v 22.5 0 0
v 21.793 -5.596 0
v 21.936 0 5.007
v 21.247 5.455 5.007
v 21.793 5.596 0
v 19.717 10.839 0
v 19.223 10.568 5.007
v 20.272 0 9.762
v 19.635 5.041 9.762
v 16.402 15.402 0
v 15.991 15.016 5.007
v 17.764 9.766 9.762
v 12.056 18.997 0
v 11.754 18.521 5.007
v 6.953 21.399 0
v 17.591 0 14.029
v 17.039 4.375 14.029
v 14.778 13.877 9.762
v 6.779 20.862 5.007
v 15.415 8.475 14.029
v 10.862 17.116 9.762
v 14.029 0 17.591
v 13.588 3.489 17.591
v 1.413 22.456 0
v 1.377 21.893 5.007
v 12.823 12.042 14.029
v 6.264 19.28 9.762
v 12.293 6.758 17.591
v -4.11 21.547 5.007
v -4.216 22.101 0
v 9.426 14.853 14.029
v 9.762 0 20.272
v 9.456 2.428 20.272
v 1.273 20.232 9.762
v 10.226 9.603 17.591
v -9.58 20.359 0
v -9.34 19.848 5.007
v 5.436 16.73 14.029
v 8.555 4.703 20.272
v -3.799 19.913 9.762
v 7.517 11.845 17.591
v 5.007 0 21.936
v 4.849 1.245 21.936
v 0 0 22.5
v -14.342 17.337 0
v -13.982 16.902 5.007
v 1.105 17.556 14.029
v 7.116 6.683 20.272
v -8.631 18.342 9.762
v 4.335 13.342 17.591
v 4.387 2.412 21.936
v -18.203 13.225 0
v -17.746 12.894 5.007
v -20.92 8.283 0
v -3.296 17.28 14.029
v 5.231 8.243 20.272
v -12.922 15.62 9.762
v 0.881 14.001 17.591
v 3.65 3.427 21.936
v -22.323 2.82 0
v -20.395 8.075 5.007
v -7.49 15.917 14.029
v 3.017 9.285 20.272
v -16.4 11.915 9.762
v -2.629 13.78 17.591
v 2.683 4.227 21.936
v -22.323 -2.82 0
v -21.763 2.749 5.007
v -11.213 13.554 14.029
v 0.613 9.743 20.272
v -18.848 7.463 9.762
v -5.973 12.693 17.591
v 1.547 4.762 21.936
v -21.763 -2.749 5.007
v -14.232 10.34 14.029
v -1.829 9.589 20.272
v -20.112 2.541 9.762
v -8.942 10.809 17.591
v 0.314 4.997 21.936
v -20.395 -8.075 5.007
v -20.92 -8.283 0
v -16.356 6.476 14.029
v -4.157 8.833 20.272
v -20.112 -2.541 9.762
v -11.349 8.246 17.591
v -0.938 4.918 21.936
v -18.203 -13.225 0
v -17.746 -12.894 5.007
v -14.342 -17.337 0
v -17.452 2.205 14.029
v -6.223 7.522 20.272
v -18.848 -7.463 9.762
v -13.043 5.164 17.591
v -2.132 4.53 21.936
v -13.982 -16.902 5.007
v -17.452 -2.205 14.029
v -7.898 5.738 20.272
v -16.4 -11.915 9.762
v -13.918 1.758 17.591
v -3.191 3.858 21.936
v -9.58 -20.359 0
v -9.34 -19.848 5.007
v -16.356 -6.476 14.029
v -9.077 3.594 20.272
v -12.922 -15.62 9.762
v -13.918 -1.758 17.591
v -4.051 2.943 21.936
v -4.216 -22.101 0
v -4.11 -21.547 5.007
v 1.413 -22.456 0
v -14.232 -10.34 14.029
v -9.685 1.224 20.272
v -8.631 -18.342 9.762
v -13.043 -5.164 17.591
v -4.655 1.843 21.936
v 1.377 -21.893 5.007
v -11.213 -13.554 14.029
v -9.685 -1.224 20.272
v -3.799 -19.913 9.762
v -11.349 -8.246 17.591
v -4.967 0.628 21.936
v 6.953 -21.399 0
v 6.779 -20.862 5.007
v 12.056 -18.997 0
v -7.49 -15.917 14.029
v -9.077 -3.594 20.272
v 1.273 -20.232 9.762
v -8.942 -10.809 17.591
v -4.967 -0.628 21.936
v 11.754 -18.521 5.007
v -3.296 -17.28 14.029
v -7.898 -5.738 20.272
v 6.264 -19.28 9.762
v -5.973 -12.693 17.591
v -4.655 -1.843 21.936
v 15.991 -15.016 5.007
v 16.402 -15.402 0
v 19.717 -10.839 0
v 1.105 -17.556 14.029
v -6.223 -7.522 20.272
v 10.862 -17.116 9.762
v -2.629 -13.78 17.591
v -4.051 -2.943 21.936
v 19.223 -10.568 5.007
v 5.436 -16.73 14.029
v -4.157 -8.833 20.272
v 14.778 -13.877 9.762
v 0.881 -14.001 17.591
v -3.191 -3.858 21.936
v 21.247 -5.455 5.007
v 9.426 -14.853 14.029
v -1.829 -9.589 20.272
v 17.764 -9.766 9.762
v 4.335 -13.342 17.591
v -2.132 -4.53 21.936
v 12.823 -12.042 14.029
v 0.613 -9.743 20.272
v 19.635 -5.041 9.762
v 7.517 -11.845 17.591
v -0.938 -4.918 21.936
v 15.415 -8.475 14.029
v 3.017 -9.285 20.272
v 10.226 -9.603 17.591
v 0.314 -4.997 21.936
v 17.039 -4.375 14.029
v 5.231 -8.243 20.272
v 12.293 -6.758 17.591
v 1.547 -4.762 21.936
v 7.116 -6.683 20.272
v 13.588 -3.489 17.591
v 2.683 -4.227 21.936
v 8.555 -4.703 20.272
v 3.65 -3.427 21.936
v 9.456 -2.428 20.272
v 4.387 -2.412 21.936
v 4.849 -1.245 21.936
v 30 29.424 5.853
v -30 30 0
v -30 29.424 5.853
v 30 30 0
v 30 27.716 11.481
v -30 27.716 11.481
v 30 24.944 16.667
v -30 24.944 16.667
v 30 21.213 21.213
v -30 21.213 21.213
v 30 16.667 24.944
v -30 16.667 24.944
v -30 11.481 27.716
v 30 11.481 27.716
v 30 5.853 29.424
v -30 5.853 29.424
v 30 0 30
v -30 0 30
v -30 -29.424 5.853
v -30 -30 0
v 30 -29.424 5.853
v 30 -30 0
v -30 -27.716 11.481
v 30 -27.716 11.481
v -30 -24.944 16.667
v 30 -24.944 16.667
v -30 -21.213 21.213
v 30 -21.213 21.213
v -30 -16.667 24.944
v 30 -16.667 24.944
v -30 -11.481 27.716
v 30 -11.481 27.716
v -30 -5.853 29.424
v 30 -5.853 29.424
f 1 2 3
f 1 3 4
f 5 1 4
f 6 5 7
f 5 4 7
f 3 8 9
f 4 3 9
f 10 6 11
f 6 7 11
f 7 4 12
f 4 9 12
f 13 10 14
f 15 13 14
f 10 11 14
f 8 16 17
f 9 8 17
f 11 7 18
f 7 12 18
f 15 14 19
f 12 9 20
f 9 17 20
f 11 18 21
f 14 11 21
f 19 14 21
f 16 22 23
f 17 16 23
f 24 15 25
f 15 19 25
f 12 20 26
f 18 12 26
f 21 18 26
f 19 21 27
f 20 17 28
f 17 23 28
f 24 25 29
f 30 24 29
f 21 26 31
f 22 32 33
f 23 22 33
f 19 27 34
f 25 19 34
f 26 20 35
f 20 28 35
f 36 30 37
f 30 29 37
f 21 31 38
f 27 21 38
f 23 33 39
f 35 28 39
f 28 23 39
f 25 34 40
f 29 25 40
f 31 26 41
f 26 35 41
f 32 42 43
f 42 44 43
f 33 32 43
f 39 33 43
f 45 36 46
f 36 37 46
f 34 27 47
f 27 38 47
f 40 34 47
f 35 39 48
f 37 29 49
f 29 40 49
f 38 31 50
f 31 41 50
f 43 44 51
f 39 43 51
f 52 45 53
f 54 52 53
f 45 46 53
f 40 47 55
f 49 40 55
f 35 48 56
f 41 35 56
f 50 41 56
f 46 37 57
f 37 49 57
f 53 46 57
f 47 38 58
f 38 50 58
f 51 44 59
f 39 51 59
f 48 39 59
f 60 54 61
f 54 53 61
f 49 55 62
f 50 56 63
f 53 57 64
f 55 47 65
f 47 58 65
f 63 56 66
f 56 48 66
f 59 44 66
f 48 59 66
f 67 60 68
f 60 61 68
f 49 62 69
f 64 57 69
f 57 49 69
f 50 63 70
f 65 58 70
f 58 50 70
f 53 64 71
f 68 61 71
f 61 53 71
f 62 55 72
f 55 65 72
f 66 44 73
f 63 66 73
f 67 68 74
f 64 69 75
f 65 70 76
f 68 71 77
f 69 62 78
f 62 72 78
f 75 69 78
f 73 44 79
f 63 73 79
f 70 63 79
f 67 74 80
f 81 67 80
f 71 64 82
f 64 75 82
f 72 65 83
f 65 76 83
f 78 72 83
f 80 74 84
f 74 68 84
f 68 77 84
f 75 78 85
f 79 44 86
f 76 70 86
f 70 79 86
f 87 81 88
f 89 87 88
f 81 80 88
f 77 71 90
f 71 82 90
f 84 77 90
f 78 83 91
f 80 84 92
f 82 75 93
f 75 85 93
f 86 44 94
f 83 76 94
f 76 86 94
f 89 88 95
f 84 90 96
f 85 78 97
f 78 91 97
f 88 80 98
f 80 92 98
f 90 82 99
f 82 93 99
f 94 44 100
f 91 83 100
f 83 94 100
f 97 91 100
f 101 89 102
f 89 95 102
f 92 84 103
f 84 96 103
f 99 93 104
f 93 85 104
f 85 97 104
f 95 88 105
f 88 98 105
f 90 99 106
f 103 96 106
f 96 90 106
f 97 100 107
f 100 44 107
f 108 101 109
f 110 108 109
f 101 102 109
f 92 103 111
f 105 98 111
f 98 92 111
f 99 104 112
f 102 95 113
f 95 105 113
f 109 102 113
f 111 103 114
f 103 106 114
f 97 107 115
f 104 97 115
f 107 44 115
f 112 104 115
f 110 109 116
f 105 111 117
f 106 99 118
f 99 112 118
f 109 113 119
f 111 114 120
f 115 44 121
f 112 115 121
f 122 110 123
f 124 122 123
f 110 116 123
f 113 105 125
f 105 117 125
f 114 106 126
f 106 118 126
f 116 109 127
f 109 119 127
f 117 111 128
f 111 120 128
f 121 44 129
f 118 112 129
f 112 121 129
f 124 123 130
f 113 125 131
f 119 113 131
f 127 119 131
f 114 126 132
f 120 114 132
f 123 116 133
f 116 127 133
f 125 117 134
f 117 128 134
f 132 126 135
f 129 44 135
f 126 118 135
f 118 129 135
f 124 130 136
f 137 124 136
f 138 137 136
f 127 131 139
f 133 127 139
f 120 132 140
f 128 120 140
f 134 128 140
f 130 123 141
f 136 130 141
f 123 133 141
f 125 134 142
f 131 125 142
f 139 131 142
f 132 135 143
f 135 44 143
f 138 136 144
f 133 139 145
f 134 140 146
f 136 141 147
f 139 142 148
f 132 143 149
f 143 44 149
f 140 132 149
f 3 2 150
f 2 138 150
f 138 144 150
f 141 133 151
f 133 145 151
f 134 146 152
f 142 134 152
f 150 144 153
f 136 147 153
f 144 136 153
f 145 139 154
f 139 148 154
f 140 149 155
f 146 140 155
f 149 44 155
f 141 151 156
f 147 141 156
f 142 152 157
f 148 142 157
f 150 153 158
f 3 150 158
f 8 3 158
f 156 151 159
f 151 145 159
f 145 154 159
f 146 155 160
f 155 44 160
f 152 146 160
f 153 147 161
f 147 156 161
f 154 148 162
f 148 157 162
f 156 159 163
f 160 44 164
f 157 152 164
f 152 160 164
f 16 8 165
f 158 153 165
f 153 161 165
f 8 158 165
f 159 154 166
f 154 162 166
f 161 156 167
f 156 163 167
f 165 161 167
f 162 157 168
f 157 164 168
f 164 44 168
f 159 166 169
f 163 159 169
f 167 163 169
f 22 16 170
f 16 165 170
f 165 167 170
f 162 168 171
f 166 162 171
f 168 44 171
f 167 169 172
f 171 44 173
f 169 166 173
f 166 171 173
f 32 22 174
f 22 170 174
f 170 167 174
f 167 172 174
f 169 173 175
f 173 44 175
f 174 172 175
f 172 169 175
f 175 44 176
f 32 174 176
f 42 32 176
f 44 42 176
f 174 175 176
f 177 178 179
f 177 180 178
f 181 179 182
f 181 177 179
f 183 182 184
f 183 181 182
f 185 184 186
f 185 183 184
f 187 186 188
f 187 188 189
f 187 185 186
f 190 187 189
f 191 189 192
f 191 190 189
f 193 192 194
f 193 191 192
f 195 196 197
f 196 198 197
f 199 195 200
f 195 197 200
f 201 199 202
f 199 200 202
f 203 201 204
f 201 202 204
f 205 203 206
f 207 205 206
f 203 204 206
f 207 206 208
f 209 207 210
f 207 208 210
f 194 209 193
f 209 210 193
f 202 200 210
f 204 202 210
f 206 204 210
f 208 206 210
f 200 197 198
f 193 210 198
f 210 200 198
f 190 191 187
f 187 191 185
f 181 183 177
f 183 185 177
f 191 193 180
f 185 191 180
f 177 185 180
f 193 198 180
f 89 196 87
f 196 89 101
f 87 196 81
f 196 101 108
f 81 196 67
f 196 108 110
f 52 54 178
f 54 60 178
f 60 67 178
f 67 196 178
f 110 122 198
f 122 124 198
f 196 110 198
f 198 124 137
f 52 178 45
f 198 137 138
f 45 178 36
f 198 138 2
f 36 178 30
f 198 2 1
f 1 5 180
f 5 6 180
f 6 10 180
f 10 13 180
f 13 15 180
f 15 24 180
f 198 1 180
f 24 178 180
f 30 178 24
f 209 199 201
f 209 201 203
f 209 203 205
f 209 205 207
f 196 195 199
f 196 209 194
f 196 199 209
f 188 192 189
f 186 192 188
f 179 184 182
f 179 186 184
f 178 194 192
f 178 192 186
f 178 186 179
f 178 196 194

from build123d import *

# Parameters (mm, degrees)
F0_W     = 60
F0_H     = 60
F0_R     = 22.5
F1_DEPTH = 30
F2_DEPTH = 22.5
F3_R     = 22.49999
F4_R     = 29.99999


# Not quite as in the source:
# - a fillet or chamfer is up to 0.001 mm smaller than in the source, because OpenCascade refuses the exact size
# - a feature names something its author has since deleted; it is built from what else it names


with BuildPart() as f1:
    # F0 (on Top) → F1 (new body)
    with BuildSketch(Plane.XY):
        Rectangle(F0_W, F0_H)
        Circle(F0_R, mode=Mode.SUBTRACT)
        Circle(F0_R)
    extrude(amount=F1_DEPTH)

    # F0 (on Top) → F2 (cut)
    with BuildSketch(Plane.XY):
        Circle(F0_R)
    extrude(amount=F2_DEPTH, mode=Mode.SUBTRACT)

    # F3 (radius 22.5 in the source; OpenCascade refuses exactly that, so slightly less here)
    f3_edges = [f1.edges().sort_by_distance(p)[0] for p in [
        (-22.5, 0, 22.5),
    ]]
    fillet(f3_edges, radius=F3_R)

    # F4 (radius 30 in the source; OpenCascade refuses exactly that, so slightly less here)
    f4_edges = [f1.edges().sort_by_distance(p)[0] for p in [
        (0, -30, 30),
        (0, 30, 30),
    ]]
    fillet(f4_edges, radius=F4_R)


solid = f1.part
